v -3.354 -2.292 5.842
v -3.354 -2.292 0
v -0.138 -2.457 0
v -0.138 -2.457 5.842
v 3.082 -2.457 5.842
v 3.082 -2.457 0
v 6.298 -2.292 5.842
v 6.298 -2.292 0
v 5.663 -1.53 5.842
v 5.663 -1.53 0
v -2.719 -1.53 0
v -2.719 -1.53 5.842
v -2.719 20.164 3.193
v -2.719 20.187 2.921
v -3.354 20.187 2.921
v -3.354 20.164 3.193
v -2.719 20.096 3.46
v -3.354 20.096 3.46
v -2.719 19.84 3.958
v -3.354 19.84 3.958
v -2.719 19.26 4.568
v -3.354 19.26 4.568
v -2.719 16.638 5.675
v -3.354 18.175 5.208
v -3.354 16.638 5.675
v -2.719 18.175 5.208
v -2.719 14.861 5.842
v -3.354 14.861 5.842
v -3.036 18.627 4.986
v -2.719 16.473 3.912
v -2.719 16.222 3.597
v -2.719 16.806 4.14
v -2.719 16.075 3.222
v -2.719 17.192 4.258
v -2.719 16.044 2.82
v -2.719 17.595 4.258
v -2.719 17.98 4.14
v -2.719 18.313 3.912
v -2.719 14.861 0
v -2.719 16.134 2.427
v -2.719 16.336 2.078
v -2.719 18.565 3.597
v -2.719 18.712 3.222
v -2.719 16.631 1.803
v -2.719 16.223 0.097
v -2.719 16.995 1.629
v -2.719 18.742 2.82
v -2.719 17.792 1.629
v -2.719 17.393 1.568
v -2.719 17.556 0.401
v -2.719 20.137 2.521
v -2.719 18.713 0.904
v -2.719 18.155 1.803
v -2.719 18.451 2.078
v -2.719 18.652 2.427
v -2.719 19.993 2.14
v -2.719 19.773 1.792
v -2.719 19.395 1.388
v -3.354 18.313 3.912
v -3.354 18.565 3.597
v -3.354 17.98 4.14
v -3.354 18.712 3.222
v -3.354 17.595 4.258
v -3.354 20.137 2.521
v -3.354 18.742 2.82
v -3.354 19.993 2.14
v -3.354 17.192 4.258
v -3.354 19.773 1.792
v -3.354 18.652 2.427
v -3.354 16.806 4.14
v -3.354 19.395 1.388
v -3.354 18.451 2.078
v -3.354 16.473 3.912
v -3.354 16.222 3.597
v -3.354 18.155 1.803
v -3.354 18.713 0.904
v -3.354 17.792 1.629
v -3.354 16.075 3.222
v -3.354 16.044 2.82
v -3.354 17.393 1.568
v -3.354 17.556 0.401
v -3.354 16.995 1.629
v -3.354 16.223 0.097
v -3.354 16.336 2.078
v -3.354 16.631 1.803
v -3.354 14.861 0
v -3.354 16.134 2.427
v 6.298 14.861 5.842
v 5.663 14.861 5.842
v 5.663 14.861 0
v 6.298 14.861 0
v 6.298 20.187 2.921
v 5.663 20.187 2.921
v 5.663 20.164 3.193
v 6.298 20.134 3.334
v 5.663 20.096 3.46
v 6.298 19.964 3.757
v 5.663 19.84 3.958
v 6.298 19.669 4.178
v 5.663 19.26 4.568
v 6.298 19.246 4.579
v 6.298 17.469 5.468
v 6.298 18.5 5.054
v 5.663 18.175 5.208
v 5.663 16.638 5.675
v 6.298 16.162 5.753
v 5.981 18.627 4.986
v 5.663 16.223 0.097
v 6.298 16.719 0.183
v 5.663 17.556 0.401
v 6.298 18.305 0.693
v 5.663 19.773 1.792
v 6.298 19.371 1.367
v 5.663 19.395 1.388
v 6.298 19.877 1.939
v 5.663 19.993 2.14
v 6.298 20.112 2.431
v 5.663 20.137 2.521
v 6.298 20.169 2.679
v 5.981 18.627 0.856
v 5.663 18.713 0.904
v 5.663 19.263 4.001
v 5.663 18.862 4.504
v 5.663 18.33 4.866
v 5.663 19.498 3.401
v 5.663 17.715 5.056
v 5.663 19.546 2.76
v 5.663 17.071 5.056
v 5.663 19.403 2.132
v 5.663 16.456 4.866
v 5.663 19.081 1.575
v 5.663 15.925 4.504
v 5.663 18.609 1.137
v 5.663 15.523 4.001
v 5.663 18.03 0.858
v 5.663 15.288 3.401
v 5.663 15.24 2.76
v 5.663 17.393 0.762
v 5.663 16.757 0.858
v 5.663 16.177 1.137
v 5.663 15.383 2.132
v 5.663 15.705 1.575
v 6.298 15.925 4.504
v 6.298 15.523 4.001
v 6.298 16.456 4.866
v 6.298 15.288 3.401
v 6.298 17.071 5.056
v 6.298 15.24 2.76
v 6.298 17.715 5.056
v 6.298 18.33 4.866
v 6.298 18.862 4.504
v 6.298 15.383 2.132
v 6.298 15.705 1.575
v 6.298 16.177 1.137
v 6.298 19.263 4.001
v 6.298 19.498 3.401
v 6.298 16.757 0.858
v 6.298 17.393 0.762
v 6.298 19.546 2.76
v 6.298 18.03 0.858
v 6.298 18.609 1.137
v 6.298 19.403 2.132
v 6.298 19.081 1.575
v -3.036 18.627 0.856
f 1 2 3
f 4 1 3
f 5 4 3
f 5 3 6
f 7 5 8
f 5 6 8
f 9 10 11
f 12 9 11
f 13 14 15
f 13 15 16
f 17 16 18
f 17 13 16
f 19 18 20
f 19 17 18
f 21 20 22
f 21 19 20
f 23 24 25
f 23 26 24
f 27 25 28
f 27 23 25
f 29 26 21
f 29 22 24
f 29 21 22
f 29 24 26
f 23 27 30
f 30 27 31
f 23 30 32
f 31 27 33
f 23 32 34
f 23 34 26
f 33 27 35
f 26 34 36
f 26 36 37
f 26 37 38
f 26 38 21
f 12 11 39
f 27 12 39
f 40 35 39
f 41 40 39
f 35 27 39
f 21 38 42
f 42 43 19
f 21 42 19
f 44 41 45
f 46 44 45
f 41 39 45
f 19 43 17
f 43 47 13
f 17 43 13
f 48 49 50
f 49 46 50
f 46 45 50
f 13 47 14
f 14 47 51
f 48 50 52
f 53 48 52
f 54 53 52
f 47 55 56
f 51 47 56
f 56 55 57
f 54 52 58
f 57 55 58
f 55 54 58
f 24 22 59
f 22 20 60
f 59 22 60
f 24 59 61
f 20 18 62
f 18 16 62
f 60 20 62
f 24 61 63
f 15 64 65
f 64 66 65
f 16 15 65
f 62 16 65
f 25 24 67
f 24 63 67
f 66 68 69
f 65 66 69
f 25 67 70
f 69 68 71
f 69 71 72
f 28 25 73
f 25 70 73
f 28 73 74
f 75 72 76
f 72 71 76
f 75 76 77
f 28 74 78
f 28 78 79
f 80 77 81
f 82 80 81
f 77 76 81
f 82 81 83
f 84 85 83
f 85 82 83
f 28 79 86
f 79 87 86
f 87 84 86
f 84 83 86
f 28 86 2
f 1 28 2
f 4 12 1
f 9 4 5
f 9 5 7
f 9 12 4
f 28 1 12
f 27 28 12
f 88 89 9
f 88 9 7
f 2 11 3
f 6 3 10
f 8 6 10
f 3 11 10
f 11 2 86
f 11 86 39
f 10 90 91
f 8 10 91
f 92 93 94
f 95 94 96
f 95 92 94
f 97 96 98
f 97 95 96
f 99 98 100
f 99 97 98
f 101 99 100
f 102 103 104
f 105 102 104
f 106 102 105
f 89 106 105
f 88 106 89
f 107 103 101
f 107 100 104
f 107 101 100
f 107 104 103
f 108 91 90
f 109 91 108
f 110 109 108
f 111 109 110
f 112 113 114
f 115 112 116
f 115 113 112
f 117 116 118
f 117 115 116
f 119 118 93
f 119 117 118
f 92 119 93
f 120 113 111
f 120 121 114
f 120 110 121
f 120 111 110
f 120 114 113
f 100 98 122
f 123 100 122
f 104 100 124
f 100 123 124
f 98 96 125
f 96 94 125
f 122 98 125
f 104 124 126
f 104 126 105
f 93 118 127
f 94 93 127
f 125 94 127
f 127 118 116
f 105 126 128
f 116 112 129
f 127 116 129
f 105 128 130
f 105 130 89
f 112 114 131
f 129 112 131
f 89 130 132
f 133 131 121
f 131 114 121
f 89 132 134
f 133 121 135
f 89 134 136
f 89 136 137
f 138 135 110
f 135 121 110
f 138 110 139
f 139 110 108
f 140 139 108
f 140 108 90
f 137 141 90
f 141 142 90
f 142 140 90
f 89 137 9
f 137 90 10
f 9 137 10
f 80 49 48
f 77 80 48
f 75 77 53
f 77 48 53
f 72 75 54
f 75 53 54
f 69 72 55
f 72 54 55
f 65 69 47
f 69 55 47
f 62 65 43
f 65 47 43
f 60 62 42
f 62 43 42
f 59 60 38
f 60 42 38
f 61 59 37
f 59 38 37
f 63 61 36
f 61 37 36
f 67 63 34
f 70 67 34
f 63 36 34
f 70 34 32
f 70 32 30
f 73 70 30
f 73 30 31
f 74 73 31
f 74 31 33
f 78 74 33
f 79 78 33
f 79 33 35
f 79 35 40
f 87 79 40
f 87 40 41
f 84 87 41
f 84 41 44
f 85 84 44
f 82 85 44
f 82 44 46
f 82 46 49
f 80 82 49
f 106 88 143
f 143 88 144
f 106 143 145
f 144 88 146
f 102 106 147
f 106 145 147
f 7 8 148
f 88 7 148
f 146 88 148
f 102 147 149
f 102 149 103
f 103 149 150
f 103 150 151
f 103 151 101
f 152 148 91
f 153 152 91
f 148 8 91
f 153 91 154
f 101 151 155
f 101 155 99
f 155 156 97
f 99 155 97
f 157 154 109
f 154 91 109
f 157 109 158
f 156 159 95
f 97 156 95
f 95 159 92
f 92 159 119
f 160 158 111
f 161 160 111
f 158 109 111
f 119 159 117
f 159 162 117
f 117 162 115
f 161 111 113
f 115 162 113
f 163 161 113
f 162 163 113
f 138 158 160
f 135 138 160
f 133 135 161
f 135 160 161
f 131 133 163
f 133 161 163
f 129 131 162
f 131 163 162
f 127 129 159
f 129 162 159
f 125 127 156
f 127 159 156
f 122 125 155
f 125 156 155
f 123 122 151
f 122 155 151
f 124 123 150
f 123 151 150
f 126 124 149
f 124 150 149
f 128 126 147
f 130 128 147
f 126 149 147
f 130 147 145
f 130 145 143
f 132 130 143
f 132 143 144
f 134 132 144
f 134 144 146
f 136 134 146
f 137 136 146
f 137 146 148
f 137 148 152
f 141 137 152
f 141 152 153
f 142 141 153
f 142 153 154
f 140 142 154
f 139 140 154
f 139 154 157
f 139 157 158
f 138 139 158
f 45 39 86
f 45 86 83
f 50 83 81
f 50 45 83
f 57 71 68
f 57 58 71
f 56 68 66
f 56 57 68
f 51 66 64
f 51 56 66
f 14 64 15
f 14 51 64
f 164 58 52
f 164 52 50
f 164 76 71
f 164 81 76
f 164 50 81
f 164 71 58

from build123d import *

# Parameters (mm, degrees)
BOSS_EXTRUDE1_DEPTH       = 5.842
F_6_32_TAPPED_HOLE1_D     = 2.7051
F_6_32_TAPPED_HOLE1_DEPTH = 0.635
CUT_EXTRUDE1_REACH        = 11.652
SKETCH6_R                 = 2.159
BOSS_EXTRUDE2_DEPTH       = 5.842
CUT_EXTRUDE4_DEPTH        = 10.652


with BuildPart() as part:
    # Sketch1 → Boss-Extrude1 (new body)
    with BuildSketch(Plane.XY):
        Polygon((-3.353873239, 20.18718662), (-3.353873239, -2.29181338), (6.298126761, -2.29181338), (6.298126761, 20.18718662), (5.663126761, 20.18718662), (5.663126761, -1.52981338), (-2.718873239, -1.52981338), (-2.718873239, 20.18718662), align=None)
    extrude(amount=BOSS_EXTRUDE1_DEPTH)

    # #6-32 Tapped Hole1
    with Locations(Plane.ZY.offset(3.353873239)):
        with Locations((2.921, 17.39318662)):
            Hole(F_6_32_TAPPED_HOLE1_D / 2, depth=F_6_32_TAPPED_HOLE1_DEPTH)

    # Sketch6 → Cut-Extrude1 (cut, up to next)
    with BuildSketch(Plane(origin=(6.298126761, 0, 0), x_dir=(0, 0, -1), z_dir=(1, 0, 0)), mode=Mode.PRIVATE) as cut_extrude1_sk1:
        with Locations((-2.921, 17.39318662)):
            Circle(SKETCH6_R)
    cut_extrude1_tool1 = extrude(cut_extrude1_sk1.sketch, amount=-CUT_EXTRUDE1_REACH, mode=Mode.PRIVATE) & part.part
    add(cut_extrude1_tool1.solids().sort_by_distance((6.298127, 17.393187, 2.921))[0], mode=Mode.SUBTRACT)

    # Sketch15 → Boss-Extrude2 (add, through all)
    with BuildSketch(Plane.XY):
        with BuildLine():
            Line((6.298126761, -2.29181338), (-3.353873239, -2.29181338))
            ThreePointArc((-3.353873239, -2.29181338), (1.472126761, -2.477704159), (6.298126761, -2.29181338))
        make_face()
    extrude(amount=BOSS_EXTRUDE2_DEPTH)

    # Sketch28 → Cut-Extrude4 (cut, through all)
    with BuildSketch(Plane(origin=(6.298126761, 0, 0), x_dir=(0, 0, -1), z_dir=(1, 0, 0))):
        with BuildLine():
            Line((-5.842, 20.18718662), (-5.842, 14.860557672))
            add(Edge.make_bspline(
                [(-2.921, 20.18718662), (-5.842, 20.18718662), (-5.842, 14.860557672)],
                knots=[6.283185307, 6.283185307, 6.283185307, 7.853981634, 7.853981634, 7.853981634], degree=2, weights=[1, 0.707106781, 1]))
            Line((-2.920999983, 20.18718662), (-5.842, 20.18718662))
        make_face()
        with BuildLine():
            Line((0, 20.18718662), (-2.920999983, 20.18718662))
            add(Edge.make_bspline(
                [(0, 14.860557672), (0, 20.18718662), (-2.921, 20.18718662)],
                knots=[4.71238898, 4.71238898, 4.71238898, 6.283185307, 6.283185307, 6.283185307], degree=2, weights=[1, 0.707106781, 1]))
            Line((0, 14.860557672), (0, 20.18718662))
        make_face()
    extrude(amount=-CUT_EXTRUDE4_DEPTH, mode=Mode.SUBTRACT)


solid = part.part
